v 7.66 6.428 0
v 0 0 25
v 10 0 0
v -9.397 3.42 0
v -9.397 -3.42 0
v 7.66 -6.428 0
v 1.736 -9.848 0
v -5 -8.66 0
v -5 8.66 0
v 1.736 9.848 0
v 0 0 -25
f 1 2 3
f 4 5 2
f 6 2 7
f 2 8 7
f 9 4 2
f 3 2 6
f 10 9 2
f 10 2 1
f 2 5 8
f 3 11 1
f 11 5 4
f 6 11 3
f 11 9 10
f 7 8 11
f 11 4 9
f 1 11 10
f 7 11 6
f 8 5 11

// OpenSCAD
//
// N-sided dice generator
//

numberOfFacesToGenerate = 18;
diceHeightInMm = 50;
diceDiameterInMm = 20;


/*
    SharpPyramid:
        Range: 6-∞ (even numbered dice only!)
*/
//Dice_SharpPyramid(numberOfFacesToGenerate, diceHeightInMm, diceDiameterInMm);
module Dice_SharpPyramid(numberOfFacesToGenerate, diceHeightInMm, diceDiameterInMm) {
    PyramidDice_Raw(numberOfFacesToGenerate, diceHeightInMm, diceDiameterInMm);
}



/*
    SmoothedPyramid:
        Range: 6-∞ (even and odd numbers)
*/
Dice_SmoothedPyramid(numberOfFacesToGenerate, diceHeightInMm, diceDiameterInMm);
module Dice_SmoothedPyramid(numberOfFacesToGenerate, diceHeightInMm, diceDiameterInMm) {
    // Start with the sharp pyrmid
    roundingAmount = 5;//TODO !!!! needs to be var!!!
    $fn=100;

    union() {
        minkowski() {
            PyramidDice_Raw(numberOfFacesToGenerate, diceHeightInMm, diceDiameterInMm);
            translate([0,0,diceHeightInMm/2/*-roundingAmount/2*/]) {
                //sphere(d = roundingAmount);
            }
        }
    }
}

module PyramidDice_Raw(numberOfFacesToGenerate, diceHeightInMm, diceDiameterInMm) {
    difference() {
        union() {
            PyramidDice_Component_Half(numberOfFacesToGenerate, floor(numberOfFacesToGenerate/2), true, diceHeightInMm, diceDiameterInMm);
            PyramidDice_Component_Half(numberOfFacesToGenerate, ceil(numberOfFacesToGenerate/2), false, diceHeightInMm, diceDiameterInMm);
        }

        // If the number of sides is odd we will need to trim the dice
        if (numberOfFacesToGenerate%2) {
            union() {
                // Top
                union() {
                    facesThisSide = floor(numberOfFacesToGenerate/2);
                    incrementDegTop = 360/facesThisSide;
                    startDegTop = incrementDegTop/2;
                    endDegTop = ((facesThisSide-1)*incrementDegTop)+startDegTop;
                    remainingAngle = 90 - startDegTop;
                    rotateAmount = facesThisSide%2 ? 0 : -startDegTop;

                    for (topDeg = [startDegTop : incrementDegTop : endDegTop]) {
                        rotate([0,0,topDeg]) {
                            translate([((sin(remainingAngle)*(diceDiameterInMm/2))/(sin(90)))*2,0,0]) {
                                rotate([180,0,rotateAmount]) {
                                    PyramidDice_Component_Half(numberOfFacesToGenerate, facesThisSide, true, diceHeightInMm, diceDiameterInMm);
                                }
                            }
                        }
                    }
                }

                // Bottom
                union () {
                    facesThisSide = floor(numberOfFacesToGenerate/2);
                    incrementDegBtm = 360/ceil(numberOfFacesToGenerate/2);
                    startDegBtm = incrementDegBtm/2;
                    endDegBtm = ((ceil(numberOfFacesToGenerate/2)-1)*incrementDegBtm)+startDegBtm;
                    remainingAngle = 90 - startDegBtm;
                    rotateAmount = facesThisSide%2 ? startDegBtm : -startDegBtm ;

                    rotate([0,0,180]) {
                        for (btmDeg = [startDegBtm : incrementDegBtm : endDegBtm]) {
                            rotate([0,0,btmDeg]) {
                                translate([((sin(remainingAngle)*(diceDiameterInMm/2))/(sin(90)))*2,0,0]) {
                                    rotate([180,0,rotateAmount]) {
                                        PyramidDice_Component_Half(numberOfFacesToGenerate, ceil(numberOfFacesToGenerate/2), false, diceHeightInMm, diceDiameterInMm);
                                    }
                                }
                            }
                        }
                    }
                }
            }
        }
    }
}


module PyramidDice_Component_Half(totalNumberOfFaces, fn, isTheTopSide, diceHeightInMm, diceDiameterInMm) {
    // r1/r2 values set the top or bottom diameter depending on which side we are building
    r1Val = 0;
    r2Val = 0;
    if (isTheTopSide) {
        translate([0, 0, diceHeightInMm/4]) {
            r1Val = diceDiameterInMm/2;
            cylinder($fn = fn, h = diceHeightInMm/2, r1 = r1Val, r2 = r2Val, center = true);
        }
    } else {
        translate([0, 0, -diceHeightInMm/4]) {
            r2Val = diceDiameterInMm/2;
            // If we have an even number of sides, don't rotate the bottom half. Otherwise
            // we'll rotate the bottom part so it's more evenly balanced.
            if (totalNumberOfFaces%2) {
                // Odd, rotate the part
                rotate([0,0,180]) {
                    cylinder($fn = fn, h = diceHeightInMm/2, r1 = r1Val, r2 = r2Val, center = true);
                }
            } else {
                // Even, don't rotate the part
                cylinder($fn = fn, h = diceHeightInMm/2, r1 = r1Val, r2 = r2Val, center = true);
            }
        }
    }
}
